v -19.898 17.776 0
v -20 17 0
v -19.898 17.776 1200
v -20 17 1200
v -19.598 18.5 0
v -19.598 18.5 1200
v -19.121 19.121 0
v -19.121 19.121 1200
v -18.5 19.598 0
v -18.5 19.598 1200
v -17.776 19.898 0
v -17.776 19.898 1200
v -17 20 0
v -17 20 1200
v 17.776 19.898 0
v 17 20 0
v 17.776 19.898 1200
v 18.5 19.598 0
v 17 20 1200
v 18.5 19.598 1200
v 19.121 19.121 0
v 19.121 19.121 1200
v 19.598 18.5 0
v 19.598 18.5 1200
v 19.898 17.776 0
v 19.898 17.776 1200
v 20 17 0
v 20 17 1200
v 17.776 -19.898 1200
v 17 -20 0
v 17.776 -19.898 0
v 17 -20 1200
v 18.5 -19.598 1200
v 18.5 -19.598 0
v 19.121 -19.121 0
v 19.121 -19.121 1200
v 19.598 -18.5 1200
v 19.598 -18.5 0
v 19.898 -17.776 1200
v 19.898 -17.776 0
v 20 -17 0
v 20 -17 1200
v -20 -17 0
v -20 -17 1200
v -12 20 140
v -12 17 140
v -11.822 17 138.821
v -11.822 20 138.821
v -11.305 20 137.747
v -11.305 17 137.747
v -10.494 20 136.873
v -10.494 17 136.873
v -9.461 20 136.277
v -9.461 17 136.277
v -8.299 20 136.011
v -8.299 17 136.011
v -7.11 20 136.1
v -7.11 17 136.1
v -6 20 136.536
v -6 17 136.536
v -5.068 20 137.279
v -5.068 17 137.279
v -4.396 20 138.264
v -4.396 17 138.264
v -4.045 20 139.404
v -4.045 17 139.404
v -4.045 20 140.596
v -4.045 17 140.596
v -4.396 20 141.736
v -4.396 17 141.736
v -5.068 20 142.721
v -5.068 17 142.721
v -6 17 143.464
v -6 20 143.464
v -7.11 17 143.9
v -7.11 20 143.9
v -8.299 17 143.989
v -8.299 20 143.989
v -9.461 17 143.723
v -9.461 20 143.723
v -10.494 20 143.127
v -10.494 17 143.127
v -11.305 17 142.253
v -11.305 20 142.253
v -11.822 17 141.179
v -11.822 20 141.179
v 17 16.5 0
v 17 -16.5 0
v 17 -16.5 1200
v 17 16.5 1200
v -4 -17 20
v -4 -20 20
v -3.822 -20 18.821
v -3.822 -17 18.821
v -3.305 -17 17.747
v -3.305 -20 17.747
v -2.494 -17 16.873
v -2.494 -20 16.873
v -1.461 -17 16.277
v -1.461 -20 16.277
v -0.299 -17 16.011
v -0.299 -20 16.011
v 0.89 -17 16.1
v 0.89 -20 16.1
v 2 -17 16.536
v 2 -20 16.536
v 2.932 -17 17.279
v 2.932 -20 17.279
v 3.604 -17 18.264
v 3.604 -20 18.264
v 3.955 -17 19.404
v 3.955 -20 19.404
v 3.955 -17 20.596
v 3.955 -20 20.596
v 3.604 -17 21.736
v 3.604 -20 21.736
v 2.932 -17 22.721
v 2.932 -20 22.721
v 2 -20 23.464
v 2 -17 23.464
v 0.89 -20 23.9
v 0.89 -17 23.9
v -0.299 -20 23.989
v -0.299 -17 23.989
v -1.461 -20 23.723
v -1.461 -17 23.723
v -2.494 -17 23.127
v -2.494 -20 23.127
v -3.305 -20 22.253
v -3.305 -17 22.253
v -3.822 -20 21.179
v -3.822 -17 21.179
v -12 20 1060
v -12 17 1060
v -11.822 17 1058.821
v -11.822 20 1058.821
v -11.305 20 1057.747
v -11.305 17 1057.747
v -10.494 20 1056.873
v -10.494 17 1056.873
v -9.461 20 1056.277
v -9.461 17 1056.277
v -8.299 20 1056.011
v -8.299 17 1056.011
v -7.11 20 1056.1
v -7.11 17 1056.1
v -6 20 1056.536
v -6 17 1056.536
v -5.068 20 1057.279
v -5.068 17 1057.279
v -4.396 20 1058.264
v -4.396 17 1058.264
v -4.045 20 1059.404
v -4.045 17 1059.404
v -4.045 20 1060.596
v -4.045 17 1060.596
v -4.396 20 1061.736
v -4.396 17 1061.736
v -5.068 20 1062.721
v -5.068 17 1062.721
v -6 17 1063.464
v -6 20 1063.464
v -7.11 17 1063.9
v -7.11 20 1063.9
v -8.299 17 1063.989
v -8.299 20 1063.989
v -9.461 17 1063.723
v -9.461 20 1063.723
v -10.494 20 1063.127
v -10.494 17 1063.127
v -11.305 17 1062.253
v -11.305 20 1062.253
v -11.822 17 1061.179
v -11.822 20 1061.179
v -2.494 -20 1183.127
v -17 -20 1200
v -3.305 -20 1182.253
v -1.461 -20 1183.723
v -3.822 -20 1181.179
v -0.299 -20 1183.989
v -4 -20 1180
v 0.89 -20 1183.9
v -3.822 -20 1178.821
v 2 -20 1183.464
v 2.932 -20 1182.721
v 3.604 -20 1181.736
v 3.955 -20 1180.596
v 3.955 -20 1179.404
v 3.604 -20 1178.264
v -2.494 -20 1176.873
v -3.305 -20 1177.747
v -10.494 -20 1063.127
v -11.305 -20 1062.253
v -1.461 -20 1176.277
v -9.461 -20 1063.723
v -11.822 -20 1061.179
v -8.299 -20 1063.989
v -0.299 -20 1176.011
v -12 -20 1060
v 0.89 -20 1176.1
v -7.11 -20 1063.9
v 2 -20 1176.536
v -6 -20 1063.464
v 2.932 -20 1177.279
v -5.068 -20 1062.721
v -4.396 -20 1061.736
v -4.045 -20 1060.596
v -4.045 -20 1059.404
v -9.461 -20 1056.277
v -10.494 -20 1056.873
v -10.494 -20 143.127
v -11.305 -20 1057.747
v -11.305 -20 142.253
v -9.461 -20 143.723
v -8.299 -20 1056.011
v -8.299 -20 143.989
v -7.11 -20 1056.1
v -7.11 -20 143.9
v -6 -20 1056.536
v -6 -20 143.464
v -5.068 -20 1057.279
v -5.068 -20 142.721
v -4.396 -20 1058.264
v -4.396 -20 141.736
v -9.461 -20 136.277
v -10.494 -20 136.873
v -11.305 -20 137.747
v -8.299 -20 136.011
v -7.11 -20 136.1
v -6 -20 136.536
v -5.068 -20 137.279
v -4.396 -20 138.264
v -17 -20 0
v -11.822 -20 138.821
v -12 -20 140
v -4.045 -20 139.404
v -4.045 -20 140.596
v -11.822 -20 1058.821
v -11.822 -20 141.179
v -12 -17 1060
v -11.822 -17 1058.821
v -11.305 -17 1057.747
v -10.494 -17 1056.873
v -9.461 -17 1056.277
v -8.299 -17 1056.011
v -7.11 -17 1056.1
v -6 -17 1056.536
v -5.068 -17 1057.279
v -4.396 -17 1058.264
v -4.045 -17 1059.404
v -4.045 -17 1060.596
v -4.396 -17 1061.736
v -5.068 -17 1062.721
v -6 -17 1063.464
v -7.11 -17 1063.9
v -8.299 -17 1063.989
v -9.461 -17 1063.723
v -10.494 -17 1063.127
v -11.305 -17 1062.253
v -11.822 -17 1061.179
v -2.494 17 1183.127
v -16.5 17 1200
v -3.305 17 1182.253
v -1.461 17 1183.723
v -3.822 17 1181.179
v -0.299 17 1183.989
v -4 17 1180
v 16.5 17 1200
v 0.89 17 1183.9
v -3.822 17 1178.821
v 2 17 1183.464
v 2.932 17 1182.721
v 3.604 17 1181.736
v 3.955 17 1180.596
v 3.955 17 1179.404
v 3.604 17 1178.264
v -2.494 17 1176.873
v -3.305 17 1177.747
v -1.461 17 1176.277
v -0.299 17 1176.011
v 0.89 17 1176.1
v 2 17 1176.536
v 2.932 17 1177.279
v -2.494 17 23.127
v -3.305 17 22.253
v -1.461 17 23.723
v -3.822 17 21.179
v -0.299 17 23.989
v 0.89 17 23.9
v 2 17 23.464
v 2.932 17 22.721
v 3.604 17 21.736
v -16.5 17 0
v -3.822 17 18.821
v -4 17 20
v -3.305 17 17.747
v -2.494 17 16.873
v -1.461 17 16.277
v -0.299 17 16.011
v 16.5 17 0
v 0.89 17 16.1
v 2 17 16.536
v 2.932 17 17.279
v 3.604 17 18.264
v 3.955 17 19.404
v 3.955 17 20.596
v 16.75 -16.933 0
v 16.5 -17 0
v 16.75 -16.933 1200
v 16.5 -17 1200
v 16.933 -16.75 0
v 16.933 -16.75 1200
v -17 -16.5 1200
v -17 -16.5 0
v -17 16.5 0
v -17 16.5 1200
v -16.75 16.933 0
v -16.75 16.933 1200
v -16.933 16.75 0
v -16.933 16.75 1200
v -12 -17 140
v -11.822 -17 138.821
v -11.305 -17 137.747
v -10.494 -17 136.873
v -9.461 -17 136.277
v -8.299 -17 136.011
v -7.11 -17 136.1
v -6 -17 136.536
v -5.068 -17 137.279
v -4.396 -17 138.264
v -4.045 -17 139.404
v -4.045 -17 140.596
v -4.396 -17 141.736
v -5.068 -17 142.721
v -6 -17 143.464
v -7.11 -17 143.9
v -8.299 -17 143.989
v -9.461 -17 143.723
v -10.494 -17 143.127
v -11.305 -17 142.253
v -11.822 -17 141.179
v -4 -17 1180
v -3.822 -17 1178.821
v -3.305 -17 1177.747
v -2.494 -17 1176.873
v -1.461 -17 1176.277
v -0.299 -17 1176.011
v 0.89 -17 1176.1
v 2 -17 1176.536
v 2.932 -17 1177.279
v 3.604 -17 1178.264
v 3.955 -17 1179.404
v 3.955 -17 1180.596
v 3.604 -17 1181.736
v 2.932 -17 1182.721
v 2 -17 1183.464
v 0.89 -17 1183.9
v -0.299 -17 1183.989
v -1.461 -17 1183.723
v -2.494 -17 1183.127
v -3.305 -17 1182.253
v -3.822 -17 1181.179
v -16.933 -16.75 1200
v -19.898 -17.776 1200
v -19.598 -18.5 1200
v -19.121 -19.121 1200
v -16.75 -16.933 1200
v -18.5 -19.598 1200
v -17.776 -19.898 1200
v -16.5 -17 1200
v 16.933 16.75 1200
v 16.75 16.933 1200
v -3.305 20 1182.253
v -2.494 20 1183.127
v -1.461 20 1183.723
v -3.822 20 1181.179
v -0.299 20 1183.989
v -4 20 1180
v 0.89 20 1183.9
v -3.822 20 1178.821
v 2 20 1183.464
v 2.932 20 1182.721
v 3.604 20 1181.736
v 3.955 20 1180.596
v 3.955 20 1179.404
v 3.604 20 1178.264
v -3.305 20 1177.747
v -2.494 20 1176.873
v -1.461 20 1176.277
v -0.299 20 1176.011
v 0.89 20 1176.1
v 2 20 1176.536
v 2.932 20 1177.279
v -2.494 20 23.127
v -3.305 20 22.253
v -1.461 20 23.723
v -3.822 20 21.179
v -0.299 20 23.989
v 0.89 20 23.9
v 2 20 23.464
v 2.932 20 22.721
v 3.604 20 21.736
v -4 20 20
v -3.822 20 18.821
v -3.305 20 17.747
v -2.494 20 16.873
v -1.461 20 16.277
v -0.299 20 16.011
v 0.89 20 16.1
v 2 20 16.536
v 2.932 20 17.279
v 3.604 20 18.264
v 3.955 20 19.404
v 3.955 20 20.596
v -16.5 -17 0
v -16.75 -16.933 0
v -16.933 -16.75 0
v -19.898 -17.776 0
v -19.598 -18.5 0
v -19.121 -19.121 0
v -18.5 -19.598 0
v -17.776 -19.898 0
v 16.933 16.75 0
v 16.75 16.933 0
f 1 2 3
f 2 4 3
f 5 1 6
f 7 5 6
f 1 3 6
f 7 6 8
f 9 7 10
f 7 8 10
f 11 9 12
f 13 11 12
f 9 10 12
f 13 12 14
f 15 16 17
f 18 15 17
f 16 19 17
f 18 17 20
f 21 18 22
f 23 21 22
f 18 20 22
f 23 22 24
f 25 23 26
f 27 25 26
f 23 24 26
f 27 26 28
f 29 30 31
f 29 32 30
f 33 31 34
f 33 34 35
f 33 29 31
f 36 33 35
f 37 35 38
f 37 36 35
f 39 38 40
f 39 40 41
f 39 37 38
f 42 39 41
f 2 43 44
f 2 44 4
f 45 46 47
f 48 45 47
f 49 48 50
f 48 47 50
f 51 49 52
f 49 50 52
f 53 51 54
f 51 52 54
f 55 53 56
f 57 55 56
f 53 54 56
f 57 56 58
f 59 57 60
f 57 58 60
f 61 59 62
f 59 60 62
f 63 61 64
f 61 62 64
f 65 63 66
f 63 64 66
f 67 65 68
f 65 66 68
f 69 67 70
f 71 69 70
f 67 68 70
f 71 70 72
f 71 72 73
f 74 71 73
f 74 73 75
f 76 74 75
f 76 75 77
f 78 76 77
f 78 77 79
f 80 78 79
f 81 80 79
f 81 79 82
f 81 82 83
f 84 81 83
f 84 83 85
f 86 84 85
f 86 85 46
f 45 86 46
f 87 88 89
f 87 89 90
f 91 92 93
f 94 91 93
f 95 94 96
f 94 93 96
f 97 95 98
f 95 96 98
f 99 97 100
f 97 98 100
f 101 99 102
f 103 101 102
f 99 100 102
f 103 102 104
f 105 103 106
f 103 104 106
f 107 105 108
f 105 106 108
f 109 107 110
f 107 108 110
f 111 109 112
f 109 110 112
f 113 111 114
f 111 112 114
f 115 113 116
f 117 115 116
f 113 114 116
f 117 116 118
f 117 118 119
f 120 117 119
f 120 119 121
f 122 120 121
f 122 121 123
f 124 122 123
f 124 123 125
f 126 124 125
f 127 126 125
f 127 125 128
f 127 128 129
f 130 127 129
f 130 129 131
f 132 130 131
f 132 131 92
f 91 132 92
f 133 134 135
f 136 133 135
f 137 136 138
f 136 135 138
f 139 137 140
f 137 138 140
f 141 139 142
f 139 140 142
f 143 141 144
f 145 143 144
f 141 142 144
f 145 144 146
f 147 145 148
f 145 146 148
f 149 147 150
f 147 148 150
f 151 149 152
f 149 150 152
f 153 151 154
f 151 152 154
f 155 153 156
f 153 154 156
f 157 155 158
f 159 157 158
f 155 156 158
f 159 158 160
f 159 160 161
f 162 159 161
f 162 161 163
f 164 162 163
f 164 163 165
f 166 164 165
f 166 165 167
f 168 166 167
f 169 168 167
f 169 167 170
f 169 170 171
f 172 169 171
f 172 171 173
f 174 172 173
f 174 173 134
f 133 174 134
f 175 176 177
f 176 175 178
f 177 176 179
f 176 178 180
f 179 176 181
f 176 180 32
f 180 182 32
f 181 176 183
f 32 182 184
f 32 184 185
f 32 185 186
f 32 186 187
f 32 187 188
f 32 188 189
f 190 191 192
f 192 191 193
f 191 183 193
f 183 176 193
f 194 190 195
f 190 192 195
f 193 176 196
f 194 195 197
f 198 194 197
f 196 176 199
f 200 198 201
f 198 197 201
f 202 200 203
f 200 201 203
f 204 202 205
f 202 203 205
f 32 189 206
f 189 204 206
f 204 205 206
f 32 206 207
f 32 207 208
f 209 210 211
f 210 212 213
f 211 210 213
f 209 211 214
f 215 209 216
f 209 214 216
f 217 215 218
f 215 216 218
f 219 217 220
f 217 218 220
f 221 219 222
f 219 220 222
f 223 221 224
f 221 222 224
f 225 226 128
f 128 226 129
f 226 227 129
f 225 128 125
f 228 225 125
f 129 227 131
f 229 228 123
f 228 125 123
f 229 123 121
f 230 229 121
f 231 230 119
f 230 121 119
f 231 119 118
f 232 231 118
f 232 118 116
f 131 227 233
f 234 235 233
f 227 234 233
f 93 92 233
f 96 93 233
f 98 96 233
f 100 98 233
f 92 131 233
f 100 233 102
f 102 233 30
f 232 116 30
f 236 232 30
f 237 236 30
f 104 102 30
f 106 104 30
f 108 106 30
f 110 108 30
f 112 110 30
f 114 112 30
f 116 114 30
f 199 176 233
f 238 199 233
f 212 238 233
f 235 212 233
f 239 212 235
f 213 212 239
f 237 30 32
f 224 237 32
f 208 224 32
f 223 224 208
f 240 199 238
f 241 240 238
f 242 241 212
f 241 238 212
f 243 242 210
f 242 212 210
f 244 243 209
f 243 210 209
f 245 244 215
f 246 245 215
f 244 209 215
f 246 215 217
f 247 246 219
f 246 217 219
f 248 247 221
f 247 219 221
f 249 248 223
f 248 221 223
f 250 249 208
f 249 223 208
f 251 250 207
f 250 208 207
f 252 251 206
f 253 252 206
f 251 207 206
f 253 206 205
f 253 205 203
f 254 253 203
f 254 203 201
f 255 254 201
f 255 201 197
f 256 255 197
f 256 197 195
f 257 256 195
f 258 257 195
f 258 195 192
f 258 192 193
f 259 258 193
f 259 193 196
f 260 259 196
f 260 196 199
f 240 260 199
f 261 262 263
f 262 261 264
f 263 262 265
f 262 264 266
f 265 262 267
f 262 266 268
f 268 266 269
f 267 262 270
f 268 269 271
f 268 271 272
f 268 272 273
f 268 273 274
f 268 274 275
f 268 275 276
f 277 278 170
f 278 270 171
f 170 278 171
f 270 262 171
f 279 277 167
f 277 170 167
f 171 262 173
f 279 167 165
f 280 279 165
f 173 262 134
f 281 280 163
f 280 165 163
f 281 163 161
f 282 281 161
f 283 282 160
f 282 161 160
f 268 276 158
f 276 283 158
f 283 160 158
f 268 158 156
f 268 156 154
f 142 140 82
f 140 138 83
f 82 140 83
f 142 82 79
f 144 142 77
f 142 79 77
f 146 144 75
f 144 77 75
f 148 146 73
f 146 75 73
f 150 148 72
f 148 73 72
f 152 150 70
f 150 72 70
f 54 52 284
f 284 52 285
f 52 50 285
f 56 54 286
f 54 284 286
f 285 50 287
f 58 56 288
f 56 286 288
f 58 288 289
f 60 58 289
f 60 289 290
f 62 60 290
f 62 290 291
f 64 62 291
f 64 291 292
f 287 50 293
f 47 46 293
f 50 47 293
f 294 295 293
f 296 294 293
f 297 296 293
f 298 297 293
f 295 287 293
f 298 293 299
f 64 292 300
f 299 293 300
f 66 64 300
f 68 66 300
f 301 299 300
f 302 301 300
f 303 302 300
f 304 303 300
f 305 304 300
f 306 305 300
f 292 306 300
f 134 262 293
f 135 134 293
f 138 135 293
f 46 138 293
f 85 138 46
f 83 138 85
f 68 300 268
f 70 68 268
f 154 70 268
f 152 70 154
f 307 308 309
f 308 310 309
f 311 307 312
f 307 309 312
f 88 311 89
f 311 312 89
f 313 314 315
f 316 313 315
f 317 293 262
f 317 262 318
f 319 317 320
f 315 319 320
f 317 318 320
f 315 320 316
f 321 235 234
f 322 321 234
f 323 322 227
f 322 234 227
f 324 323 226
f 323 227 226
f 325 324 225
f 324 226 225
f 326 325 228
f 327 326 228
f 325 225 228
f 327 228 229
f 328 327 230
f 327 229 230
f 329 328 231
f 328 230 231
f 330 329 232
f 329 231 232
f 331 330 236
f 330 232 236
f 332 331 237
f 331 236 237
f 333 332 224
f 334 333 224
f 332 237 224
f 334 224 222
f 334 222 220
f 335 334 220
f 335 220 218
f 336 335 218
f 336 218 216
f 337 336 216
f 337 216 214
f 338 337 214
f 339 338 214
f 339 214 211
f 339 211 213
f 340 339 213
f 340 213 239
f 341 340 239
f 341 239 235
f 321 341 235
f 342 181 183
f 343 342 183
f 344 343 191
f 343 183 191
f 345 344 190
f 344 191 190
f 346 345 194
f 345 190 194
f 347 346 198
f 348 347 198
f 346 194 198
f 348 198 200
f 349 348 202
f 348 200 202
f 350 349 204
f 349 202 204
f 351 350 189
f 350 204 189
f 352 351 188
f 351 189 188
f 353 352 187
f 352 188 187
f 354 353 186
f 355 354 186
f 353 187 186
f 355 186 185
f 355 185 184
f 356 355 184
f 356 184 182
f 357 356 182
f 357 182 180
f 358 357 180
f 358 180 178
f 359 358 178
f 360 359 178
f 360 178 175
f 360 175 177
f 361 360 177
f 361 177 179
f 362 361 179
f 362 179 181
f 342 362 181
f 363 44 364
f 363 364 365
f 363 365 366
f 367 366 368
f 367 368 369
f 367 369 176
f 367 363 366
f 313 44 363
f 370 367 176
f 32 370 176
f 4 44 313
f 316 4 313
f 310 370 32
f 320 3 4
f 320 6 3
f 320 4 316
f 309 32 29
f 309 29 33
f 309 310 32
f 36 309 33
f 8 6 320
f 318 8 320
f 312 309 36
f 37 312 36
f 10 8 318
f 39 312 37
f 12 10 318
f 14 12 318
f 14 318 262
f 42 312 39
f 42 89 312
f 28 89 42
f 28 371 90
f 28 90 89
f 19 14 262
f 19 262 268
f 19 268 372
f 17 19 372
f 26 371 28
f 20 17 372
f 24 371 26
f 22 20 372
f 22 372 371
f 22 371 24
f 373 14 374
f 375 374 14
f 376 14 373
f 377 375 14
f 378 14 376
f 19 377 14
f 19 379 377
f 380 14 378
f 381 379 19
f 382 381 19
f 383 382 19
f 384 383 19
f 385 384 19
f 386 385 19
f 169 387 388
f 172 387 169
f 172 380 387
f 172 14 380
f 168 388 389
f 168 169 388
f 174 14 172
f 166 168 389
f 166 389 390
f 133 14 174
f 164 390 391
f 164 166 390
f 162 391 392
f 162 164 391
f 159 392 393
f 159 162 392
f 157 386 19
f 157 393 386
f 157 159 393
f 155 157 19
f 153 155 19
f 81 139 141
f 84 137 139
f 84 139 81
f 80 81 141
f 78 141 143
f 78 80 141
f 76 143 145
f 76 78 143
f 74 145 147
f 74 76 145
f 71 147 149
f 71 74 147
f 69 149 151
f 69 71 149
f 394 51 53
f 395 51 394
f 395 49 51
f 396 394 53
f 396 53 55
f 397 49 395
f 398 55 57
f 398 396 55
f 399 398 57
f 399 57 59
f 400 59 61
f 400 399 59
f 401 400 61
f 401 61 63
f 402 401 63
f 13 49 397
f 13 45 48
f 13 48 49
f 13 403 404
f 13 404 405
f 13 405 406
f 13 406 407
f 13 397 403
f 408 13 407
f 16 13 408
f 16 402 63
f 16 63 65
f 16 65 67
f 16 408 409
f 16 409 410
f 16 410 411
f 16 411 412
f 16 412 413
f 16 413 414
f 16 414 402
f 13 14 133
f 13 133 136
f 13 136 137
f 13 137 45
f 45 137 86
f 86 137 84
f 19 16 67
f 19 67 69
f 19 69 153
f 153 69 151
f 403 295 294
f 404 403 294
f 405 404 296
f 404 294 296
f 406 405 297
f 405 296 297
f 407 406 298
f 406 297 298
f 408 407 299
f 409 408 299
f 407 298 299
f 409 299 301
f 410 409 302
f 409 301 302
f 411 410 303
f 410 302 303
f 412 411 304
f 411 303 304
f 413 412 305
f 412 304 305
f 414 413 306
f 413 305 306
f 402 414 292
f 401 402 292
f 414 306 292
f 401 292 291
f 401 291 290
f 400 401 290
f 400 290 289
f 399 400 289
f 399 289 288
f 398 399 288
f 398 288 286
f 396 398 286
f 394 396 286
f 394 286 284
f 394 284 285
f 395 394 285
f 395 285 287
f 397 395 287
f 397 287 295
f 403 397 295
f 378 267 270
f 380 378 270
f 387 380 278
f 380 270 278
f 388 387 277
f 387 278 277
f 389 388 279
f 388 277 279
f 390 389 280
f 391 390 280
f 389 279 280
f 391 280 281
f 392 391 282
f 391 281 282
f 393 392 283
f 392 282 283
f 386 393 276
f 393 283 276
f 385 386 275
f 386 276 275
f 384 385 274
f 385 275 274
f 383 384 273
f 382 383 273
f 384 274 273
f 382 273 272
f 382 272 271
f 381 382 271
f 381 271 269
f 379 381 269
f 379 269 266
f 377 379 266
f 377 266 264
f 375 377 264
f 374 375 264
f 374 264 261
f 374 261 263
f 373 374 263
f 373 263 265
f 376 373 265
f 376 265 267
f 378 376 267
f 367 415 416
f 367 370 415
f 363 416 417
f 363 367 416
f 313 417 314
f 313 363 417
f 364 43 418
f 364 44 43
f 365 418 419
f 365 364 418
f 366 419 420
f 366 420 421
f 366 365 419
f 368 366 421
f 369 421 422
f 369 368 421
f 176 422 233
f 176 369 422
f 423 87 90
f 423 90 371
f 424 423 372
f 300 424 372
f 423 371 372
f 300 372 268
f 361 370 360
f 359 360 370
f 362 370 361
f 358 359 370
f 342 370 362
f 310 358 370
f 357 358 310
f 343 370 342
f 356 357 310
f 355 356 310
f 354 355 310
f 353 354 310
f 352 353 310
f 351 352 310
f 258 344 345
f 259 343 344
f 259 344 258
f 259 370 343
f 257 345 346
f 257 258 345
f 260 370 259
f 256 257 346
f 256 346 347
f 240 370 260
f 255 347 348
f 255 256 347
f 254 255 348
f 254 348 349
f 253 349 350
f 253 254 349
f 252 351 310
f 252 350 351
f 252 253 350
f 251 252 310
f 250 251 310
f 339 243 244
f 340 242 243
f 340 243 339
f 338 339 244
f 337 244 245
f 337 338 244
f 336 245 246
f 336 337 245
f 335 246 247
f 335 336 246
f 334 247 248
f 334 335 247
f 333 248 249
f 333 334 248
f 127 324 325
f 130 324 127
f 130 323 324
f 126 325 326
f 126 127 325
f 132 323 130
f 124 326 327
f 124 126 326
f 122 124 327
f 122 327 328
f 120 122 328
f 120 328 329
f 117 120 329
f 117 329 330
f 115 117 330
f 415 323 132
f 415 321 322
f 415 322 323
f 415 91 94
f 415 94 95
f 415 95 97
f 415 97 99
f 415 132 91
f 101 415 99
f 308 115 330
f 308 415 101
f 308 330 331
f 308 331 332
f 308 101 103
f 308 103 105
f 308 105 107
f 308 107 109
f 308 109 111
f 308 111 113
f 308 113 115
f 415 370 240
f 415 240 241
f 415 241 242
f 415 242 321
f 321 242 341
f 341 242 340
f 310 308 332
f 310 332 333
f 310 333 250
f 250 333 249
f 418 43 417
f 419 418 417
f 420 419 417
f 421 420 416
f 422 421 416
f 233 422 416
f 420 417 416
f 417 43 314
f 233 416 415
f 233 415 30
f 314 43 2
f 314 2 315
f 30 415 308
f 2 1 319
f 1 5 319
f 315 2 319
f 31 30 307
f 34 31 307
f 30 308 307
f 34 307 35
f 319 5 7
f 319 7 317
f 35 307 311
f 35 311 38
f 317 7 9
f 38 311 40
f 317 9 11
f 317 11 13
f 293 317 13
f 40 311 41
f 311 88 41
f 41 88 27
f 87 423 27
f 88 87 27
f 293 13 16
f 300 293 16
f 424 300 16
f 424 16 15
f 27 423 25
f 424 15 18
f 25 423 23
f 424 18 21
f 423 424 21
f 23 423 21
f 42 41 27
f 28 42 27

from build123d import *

# Parameters (mm, degrees)
SKETCH1_W                = 40
SKETCH1_H                = 40
SKETCH1_W_2              = 34
SKETCH1_H_2              = 34
EXTRUDE_THIN1_DEPTH      = 1200
FILLET1_R                = 0.5
FILLET2_R                = 3
F_8_0_8_DIAMETER_HOLE1_D = 8
F_8_0_8_DIAMETER_HOLE2_D = 8


with BuildPart() as part:
    # Sketch1 → Extrude-Thin1 (new body)
    with BuildSketch(Plane.XY):
        Rectangle(SKETCH1_W, SKETCH1_H)
        Rectangle(SKETCH1_W_2, SKETCH1_H_2, mode=Mode.SUBTRACT)
    extrude(amount=EXTRUDE_THIN1_DEPTH)

    # Fillet1
    fillet1_edges = [part.edges().sort_by_distance(p)[0] for p in [
        (17, -17, 600),
        (17, 17, 600),
        (-17, 17, 600),
        (-17, -17, 600),
    ]]
    fillet(fillet1_edges, radius=FILLET1_R)

    # Fillet2
    fillet2_edges = [part.edges().sort_by_distance(p)[0] for p in [
        (20, -20, 600),
        (-20, -20, 600),
        (-20, 20, 600),
        (20, 20, 600),
    ]]
    fillet(fillet2_edges, radius=FILLET2_R)

    # Ø8.0 (8) Diameter Hole1 (through all)
    with Locations(Plane(origin=(0, 20, 0), x_dir=(1, 0, 0), z_dir=(0, 1, 0))):
        with Locations((0, -20), (0, -1180)):
            Hole(F_8_0_8_DIAMETER_HOLE1_D / 2)

    # Ø8.0 (8) Diameter Hole2 (through all)
    with Locations(Plane(origin=(0, 20, 0), x_dir=(1, 0, 0), z_dir=(0, 1, 0))):
        with Locations((-8, -1060), (-8, -140)):
            Hole(F_8_0_8_DIAMETER_HOLE2_D / 2)


solid = part.part
